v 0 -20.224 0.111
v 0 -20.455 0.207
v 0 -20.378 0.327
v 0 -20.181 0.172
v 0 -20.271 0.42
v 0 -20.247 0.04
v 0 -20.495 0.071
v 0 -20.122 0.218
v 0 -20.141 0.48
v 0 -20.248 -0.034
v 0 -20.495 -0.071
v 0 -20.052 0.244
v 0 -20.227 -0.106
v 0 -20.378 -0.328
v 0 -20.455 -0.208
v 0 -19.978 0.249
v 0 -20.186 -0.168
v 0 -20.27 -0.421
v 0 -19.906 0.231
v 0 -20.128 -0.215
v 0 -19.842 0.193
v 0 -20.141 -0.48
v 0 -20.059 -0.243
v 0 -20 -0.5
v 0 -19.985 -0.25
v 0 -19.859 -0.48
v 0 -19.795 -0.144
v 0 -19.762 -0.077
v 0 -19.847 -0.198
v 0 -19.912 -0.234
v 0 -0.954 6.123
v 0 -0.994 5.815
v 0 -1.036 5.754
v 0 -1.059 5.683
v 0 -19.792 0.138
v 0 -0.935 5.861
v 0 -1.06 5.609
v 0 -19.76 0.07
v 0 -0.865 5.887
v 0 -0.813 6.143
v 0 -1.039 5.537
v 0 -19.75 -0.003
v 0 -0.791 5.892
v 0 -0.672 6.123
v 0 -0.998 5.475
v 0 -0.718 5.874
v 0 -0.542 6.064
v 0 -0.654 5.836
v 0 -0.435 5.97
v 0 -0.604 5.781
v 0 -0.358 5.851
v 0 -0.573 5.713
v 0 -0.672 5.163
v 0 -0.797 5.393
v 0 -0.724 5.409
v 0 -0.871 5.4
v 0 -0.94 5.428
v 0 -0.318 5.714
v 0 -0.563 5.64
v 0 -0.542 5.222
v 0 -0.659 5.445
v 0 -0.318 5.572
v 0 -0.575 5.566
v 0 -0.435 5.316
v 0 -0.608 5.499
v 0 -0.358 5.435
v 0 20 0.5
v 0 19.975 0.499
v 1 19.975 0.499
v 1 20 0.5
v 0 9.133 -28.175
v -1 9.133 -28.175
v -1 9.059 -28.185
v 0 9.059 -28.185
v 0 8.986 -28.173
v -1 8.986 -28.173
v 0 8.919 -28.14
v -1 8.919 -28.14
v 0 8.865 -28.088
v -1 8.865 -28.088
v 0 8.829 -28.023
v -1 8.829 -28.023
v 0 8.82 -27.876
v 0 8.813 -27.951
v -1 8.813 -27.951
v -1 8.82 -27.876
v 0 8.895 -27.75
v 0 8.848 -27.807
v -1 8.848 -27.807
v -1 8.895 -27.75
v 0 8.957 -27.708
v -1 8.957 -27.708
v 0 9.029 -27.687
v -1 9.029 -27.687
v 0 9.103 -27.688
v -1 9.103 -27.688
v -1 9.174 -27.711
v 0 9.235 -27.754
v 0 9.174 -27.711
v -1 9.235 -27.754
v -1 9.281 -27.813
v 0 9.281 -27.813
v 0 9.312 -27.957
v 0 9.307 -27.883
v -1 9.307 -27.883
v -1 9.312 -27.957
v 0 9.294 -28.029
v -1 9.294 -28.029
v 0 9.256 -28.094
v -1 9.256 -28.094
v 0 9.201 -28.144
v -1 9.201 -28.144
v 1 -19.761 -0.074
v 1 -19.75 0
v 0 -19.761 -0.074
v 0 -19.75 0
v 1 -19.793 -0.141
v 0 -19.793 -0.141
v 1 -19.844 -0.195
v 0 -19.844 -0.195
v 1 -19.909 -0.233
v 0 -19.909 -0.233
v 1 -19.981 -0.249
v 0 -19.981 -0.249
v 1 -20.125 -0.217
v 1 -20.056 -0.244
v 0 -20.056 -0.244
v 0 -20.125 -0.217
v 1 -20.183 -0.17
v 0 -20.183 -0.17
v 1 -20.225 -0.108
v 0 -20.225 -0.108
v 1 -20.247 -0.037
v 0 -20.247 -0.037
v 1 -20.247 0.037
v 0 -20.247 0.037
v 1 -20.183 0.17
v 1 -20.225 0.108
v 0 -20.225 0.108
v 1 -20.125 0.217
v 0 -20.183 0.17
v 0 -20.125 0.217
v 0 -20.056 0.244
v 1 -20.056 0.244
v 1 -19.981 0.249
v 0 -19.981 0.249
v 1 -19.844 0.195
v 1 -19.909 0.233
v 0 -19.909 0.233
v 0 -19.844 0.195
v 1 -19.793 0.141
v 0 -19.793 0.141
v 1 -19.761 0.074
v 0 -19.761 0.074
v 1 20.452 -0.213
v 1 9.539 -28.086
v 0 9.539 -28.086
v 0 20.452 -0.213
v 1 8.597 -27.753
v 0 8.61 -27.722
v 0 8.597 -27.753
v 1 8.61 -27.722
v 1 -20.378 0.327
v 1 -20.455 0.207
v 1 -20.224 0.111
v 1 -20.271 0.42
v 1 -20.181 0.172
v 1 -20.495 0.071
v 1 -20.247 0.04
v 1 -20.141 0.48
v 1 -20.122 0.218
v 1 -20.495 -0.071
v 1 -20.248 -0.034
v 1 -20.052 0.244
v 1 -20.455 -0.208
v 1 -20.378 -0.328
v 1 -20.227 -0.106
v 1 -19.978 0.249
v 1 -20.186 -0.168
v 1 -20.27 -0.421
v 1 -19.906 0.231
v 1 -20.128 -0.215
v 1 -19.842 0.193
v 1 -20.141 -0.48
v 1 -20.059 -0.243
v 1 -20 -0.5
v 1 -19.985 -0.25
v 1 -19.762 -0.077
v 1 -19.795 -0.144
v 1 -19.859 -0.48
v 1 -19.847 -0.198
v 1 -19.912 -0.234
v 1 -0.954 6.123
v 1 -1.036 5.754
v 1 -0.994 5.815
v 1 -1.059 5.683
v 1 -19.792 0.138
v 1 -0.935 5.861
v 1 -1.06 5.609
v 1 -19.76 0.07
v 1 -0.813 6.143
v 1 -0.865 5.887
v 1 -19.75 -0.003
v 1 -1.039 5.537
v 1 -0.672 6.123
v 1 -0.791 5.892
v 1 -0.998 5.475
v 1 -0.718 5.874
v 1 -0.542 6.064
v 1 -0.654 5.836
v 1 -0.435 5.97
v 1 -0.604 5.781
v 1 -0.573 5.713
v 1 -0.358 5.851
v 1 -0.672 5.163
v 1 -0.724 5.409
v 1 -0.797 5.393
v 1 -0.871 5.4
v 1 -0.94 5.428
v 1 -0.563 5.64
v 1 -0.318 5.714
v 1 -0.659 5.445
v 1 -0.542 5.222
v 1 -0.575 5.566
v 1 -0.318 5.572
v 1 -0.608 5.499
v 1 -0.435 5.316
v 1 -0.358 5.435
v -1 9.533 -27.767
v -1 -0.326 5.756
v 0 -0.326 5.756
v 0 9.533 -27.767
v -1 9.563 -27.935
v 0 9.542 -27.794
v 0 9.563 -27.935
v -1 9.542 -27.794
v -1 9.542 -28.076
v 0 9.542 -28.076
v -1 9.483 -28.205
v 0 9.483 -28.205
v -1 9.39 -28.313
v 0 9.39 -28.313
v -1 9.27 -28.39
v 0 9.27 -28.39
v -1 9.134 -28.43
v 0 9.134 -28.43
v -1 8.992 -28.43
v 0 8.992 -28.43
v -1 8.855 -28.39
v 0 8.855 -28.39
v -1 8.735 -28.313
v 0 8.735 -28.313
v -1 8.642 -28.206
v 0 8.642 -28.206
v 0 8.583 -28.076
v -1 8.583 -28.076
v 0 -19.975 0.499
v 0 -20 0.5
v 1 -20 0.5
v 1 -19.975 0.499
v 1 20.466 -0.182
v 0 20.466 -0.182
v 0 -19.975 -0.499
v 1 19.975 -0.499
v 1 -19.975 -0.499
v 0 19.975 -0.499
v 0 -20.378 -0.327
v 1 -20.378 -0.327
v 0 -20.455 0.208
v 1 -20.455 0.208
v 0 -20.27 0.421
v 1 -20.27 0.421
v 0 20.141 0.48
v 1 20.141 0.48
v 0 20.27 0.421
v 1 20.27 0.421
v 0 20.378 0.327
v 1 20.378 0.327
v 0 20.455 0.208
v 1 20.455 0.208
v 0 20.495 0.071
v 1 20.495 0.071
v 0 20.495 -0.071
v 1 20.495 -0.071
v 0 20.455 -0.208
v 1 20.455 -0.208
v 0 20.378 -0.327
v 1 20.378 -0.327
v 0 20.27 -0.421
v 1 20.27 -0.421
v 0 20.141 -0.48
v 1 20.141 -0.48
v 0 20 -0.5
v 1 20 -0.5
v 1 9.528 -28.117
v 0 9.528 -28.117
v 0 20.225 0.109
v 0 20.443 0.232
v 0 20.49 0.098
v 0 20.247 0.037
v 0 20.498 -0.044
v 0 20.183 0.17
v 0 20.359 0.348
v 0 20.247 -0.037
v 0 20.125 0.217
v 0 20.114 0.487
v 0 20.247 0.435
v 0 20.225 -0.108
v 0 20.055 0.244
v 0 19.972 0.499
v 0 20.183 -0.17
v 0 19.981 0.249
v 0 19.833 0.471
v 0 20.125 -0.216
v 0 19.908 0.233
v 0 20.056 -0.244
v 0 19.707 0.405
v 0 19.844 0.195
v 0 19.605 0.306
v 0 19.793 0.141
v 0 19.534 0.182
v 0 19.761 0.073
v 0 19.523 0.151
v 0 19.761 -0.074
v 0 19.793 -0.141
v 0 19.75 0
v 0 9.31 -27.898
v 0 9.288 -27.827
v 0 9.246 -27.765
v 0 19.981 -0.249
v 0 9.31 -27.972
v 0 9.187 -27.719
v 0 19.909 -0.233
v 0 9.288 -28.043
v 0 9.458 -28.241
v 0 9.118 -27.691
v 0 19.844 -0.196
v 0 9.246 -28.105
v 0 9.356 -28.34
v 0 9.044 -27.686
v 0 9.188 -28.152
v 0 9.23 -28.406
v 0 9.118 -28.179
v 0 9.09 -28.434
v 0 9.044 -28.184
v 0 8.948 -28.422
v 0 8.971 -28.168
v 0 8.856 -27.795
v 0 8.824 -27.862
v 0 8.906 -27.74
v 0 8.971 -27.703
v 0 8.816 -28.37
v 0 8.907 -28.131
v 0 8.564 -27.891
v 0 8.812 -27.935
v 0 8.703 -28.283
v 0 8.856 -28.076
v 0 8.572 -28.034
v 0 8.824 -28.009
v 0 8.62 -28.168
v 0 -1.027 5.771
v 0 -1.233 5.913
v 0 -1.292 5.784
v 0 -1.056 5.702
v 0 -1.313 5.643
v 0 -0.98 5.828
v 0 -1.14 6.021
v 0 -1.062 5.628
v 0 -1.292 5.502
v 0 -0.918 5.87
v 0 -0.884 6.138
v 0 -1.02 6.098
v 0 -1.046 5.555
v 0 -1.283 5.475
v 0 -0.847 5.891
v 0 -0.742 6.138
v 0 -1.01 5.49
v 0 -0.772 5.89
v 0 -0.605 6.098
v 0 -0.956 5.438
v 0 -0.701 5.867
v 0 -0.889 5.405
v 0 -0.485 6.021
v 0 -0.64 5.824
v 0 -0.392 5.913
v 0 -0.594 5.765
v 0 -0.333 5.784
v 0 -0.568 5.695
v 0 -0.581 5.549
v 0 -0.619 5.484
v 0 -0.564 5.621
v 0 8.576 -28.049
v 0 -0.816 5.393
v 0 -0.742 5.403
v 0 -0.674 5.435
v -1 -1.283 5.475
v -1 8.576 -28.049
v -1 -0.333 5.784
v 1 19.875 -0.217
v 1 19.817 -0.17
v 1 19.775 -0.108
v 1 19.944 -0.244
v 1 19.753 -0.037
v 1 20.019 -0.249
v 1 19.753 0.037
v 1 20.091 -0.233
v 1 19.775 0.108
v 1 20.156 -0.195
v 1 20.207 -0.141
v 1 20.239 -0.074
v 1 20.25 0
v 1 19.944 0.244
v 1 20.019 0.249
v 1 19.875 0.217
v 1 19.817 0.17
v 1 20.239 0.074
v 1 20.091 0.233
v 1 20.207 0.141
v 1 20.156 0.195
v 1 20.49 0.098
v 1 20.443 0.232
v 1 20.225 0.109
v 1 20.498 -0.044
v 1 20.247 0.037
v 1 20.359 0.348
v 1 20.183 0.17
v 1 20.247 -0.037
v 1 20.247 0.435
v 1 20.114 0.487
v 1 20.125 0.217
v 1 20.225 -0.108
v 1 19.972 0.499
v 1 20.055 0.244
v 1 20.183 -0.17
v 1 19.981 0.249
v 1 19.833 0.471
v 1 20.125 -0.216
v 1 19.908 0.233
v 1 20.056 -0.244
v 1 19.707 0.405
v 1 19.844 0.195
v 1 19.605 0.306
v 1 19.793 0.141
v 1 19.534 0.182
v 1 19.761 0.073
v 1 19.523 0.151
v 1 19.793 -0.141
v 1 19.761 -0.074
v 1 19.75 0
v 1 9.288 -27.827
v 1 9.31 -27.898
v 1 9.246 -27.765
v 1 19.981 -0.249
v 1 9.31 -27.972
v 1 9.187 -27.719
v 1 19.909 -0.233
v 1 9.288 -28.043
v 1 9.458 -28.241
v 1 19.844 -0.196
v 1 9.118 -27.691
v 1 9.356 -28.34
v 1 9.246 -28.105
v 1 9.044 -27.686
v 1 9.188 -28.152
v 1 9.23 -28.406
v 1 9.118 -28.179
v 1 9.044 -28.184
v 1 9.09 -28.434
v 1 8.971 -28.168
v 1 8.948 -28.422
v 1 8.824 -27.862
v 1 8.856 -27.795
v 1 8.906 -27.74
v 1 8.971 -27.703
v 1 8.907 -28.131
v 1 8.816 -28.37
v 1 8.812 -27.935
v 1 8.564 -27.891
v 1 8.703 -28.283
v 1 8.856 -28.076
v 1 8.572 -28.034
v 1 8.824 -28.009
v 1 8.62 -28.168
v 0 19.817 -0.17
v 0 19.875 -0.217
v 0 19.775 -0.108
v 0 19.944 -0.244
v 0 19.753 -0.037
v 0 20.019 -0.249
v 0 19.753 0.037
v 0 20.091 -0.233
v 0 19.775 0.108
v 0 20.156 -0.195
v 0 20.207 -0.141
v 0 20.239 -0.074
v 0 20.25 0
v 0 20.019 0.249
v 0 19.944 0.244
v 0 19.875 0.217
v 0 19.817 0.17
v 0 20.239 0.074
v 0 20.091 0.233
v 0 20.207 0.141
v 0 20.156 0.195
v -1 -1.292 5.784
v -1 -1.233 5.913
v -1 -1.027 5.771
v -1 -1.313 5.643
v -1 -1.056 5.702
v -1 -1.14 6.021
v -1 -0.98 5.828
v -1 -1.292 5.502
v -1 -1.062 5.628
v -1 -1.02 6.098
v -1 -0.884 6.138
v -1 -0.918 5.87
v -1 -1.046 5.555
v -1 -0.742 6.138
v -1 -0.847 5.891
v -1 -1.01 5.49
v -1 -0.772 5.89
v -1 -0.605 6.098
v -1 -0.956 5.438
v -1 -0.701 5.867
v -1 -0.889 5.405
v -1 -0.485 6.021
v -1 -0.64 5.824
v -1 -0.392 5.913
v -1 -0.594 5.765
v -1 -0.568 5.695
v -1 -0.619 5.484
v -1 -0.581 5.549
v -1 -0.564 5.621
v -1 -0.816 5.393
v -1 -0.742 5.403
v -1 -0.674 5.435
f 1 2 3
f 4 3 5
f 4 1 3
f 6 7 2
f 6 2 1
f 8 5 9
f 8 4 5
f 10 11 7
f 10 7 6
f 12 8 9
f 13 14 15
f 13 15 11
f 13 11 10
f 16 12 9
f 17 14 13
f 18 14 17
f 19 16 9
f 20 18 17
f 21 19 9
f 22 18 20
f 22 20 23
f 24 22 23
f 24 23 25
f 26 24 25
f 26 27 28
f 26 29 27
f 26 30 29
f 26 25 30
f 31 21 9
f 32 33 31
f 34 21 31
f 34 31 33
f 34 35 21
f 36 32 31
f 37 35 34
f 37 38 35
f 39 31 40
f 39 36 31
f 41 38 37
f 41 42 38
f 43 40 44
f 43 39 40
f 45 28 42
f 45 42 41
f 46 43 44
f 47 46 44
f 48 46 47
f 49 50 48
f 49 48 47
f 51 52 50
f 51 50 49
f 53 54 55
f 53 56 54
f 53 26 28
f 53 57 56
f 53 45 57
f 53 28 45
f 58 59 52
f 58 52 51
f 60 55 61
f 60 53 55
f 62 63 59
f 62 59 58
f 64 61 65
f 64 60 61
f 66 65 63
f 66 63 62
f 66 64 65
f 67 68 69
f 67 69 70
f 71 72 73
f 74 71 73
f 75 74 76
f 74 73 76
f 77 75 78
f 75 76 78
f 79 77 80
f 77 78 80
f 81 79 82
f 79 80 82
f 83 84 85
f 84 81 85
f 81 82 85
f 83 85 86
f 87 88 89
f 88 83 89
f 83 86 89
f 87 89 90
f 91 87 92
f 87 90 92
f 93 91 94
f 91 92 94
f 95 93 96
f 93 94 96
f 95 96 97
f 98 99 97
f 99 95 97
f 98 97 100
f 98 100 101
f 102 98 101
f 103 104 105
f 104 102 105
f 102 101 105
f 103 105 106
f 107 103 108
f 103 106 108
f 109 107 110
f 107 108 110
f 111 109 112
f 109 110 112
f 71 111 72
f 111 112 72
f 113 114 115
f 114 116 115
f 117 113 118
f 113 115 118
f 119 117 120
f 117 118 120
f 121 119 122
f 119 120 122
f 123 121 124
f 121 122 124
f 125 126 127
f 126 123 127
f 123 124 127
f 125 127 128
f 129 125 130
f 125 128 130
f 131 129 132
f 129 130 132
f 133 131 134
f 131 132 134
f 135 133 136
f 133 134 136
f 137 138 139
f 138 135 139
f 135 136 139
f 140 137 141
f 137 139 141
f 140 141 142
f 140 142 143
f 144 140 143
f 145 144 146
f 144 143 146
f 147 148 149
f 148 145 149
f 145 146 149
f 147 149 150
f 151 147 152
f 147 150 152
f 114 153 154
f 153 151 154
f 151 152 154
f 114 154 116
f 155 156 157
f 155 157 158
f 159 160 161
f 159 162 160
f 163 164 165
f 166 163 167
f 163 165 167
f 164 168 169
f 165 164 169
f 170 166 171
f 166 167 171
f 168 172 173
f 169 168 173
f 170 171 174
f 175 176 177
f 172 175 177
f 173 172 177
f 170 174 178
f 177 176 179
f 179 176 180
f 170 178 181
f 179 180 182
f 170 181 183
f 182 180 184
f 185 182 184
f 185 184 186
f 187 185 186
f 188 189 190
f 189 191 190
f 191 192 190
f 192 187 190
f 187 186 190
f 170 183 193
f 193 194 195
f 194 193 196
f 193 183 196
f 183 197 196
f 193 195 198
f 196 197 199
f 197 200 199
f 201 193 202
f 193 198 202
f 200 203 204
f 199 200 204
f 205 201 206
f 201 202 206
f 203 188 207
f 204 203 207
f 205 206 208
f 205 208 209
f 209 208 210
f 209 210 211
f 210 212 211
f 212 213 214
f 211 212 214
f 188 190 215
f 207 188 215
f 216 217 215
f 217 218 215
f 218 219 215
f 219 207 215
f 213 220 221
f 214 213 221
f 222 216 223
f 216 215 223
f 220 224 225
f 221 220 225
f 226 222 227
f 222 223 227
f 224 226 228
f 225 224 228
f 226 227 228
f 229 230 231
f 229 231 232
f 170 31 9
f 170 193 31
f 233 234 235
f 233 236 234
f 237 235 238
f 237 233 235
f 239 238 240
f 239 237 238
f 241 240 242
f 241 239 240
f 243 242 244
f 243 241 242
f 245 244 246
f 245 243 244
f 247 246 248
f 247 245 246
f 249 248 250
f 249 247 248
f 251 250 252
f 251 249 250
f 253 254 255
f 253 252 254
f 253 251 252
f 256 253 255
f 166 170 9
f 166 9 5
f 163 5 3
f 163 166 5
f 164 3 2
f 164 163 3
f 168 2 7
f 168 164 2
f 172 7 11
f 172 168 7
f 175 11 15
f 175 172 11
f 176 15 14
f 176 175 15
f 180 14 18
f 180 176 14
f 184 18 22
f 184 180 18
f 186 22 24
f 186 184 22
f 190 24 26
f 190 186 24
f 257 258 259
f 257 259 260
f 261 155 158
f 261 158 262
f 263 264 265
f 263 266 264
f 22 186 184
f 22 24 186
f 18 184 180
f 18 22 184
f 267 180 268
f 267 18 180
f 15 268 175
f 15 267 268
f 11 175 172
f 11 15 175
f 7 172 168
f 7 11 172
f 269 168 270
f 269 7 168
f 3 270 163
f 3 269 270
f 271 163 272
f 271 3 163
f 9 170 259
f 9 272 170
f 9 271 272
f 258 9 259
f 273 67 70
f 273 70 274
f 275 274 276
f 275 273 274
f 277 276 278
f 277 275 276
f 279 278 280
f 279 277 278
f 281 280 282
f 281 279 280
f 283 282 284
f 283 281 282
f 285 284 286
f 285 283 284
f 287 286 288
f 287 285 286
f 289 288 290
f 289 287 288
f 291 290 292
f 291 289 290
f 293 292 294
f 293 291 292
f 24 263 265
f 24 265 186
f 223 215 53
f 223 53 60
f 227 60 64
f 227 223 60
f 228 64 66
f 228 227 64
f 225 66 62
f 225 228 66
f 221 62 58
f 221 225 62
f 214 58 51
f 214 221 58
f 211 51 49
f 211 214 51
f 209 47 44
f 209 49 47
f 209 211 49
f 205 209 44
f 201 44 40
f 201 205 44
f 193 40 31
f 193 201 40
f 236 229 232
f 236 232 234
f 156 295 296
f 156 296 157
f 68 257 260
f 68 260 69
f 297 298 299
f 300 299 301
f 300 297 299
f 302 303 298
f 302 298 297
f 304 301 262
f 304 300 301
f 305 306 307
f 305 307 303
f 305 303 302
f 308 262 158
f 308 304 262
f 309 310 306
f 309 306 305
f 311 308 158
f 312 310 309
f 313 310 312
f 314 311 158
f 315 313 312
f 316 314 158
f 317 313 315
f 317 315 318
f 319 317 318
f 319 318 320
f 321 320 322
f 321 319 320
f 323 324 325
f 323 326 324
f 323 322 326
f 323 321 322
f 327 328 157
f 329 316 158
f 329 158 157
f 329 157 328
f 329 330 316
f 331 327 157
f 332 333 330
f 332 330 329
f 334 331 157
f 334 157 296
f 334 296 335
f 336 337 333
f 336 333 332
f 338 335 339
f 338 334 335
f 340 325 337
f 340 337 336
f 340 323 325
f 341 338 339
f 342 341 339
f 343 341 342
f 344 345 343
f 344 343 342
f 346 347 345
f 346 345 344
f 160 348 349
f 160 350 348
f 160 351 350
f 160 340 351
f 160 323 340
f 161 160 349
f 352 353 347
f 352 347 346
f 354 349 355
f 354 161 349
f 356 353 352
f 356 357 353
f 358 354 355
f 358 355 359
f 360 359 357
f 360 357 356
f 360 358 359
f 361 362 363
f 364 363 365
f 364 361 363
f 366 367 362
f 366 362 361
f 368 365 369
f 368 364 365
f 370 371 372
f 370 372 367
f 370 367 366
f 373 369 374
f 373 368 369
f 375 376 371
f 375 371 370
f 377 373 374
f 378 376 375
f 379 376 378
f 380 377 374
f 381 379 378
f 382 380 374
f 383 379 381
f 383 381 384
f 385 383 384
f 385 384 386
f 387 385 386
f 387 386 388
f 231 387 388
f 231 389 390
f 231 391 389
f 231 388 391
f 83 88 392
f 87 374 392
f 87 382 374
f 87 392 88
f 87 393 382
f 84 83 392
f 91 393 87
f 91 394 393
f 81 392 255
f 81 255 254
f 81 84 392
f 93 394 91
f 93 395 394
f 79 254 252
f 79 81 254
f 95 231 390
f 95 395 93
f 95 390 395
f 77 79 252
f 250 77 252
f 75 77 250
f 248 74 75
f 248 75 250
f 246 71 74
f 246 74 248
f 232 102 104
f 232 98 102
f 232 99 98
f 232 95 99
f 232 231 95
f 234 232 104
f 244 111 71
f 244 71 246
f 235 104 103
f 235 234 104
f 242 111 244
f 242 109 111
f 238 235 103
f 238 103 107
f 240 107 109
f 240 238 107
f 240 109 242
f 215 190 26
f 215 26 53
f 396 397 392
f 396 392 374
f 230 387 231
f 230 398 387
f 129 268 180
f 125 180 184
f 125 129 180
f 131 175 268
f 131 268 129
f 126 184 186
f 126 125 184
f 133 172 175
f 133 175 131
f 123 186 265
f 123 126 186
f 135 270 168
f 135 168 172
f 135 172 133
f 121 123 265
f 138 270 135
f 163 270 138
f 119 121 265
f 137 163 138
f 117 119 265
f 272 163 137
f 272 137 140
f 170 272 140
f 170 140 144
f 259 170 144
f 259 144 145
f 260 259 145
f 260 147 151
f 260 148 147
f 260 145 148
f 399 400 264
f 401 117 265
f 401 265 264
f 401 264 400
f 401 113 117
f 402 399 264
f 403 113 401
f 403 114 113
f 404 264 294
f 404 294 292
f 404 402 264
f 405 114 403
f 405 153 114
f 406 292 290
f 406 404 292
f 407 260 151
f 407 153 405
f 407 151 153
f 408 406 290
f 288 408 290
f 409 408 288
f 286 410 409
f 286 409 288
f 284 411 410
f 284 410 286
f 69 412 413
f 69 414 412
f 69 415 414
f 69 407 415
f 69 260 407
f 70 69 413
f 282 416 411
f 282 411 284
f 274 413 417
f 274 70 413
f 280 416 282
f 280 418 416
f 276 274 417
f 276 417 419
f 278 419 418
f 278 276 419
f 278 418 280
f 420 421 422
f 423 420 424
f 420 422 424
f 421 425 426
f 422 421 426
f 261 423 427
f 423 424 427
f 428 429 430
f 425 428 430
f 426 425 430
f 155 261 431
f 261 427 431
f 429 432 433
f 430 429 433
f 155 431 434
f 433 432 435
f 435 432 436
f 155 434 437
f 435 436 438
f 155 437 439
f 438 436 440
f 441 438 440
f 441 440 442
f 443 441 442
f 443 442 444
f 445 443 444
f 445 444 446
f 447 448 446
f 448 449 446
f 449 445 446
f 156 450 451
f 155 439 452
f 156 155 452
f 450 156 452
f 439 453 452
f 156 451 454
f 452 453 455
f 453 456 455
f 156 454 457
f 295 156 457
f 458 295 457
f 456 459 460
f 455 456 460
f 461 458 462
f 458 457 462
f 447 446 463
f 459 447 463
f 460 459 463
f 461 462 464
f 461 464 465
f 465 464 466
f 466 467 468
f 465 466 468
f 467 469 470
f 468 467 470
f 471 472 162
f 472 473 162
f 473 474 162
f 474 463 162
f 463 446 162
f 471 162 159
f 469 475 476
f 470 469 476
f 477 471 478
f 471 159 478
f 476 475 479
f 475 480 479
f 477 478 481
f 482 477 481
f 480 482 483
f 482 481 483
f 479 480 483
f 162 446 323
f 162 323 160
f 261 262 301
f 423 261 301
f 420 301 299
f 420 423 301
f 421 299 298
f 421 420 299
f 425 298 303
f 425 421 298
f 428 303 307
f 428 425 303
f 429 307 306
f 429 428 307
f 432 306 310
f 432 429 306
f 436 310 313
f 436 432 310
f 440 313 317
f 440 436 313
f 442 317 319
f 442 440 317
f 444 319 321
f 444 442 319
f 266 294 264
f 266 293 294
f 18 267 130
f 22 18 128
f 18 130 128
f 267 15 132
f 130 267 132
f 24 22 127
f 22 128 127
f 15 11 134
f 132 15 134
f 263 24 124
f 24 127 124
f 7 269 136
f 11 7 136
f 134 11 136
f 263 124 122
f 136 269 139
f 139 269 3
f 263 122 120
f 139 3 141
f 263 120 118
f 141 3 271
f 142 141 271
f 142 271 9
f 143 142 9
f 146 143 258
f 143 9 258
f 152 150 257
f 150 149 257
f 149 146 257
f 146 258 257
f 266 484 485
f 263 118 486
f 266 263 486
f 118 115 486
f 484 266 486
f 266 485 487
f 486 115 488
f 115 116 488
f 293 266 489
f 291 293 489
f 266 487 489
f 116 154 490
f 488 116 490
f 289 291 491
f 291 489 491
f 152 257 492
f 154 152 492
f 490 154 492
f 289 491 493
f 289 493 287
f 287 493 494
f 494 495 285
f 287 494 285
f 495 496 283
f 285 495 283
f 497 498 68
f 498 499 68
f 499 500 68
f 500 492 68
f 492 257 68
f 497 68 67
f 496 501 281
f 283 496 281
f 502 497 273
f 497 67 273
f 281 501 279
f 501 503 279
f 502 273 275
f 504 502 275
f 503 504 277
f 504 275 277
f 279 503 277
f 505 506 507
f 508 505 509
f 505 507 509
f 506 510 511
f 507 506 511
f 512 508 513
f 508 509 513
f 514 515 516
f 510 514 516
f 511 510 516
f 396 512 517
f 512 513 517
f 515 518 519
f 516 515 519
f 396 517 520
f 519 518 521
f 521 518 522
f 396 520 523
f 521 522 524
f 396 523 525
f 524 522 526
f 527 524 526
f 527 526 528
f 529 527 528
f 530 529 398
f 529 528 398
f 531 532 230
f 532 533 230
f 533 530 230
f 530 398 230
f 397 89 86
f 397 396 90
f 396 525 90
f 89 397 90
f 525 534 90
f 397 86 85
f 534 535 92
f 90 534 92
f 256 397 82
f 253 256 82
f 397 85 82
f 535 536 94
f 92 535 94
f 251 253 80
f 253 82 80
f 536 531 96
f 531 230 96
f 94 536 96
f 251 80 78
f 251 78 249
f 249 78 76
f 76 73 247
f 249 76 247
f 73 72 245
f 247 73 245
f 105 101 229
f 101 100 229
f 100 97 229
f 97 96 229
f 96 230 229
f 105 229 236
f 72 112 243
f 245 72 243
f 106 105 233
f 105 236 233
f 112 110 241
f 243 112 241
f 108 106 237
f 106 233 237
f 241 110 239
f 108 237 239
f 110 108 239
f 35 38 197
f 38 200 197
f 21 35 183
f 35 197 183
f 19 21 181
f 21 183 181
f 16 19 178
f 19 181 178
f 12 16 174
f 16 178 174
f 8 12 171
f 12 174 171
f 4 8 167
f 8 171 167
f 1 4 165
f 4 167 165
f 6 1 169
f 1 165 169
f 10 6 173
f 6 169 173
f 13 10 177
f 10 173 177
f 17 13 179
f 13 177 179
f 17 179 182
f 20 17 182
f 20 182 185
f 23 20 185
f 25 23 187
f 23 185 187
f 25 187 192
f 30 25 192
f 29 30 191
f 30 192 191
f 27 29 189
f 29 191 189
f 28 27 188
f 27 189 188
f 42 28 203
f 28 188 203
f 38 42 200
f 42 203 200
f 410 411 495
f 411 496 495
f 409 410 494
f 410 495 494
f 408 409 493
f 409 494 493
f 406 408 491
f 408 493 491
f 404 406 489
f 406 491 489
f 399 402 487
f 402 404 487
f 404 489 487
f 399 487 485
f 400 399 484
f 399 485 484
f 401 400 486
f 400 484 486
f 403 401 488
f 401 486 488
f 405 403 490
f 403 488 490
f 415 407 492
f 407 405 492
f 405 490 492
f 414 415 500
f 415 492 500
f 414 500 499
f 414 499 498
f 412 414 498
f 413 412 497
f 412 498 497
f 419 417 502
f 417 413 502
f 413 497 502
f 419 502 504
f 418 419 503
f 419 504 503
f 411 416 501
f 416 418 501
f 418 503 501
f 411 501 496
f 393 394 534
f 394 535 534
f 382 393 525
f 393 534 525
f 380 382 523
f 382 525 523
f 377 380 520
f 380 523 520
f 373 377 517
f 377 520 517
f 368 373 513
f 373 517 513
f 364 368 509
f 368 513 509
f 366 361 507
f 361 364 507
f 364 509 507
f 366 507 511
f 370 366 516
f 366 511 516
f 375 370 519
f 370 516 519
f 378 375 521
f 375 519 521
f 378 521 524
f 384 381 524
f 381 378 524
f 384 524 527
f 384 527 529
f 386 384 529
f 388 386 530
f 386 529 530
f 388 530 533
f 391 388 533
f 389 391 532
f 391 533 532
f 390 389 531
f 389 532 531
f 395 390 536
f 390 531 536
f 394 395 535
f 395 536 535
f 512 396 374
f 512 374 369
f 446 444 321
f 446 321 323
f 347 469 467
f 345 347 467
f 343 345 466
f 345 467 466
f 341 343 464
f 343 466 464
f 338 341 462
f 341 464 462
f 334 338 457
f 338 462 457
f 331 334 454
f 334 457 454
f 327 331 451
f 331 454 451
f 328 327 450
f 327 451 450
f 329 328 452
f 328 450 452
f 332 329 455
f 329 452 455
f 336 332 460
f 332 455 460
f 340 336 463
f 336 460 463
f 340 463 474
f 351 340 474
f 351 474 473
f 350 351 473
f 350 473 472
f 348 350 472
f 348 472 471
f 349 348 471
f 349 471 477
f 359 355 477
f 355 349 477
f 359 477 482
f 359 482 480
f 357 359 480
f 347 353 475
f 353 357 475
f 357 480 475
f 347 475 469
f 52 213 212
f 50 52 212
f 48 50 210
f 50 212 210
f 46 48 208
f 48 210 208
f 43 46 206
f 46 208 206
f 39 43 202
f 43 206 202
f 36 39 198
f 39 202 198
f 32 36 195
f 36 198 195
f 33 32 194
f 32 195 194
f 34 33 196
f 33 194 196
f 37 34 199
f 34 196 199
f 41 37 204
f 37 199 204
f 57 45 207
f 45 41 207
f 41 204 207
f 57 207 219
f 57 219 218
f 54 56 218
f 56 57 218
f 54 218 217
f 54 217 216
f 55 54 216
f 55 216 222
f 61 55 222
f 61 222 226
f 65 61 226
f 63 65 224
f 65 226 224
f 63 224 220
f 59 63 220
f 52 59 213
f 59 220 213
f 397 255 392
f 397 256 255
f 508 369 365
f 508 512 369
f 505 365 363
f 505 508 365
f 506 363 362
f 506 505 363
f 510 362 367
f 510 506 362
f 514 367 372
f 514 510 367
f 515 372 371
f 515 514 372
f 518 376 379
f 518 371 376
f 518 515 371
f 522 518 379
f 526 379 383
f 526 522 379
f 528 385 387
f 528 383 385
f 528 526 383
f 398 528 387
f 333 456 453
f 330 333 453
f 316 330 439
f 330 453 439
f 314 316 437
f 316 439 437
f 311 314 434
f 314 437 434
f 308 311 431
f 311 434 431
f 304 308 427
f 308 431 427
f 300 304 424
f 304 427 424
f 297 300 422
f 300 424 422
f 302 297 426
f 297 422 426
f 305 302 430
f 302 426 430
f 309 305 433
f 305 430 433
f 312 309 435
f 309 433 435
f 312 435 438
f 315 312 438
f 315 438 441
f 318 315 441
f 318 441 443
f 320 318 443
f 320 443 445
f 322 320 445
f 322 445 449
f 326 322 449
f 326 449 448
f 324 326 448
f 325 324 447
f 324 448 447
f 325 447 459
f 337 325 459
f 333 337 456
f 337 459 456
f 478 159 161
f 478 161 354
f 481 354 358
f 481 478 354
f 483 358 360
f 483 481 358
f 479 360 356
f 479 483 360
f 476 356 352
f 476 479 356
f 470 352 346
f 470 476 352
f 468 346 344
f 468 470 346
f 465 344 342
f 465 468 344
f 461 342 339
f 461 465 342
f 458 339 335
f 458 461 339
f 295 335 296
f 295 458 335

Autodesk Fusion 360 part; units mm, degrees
sketch "Sketch1" plane through (0, 0, 0) normal (1, 0, 0) x (0, 1, 0)
  line L0 (20, -0.5) -> (-20, -0.5)
  line L1 (-20, 0.5) -> (20, 0.5)
  line L2 (20, -0.5) -> (-20, 0.5) construction
  line L3 (-20, -0.5) -> (20, 0.5) construction
  arc A0 (-19.975, 0.4994) -> (-19.975, -0.4994) centre (-20, 0) ccw
  arc A1 (19.975, -0.4994) -> (19.975, 0.4994) centre (20, 0) ccw
  circle A2 centre (-20, 0) radius 0.25
  circle A3 centre (20, 0) radius 0.25
  dimension "d1" = 40
  dimension "d2" = 0.5
  dimension "d3" = 0.5
extrude "Extrude1" add sketch "Sketch1" along normal blind 1 makes body 1
sketch "Sketch2" plane through (0, 0, 0) normal (1, 0, 0) x (0, 1, 0)
  line L0 (10, -0.5) -> (-10, -0.5)
  line L1 (-10, 0.5) -> (10, 0.5)
  line L2 (10, -0.5) -> (-10, 0.5) construction
  line L3 (-10, -0.5) -> (10, 0.5) construction
  arc A0 (-9.9501, 0.4975) -> (-9.9501, -0.4975) centre (-10, 0) ccw
  arc A1 (9.9501, -0.4975) -> (9.9501, 0.4975) centre (10, 0) ccw
  circle A2 centre (-10, 0) radius 0.25
  circle A3 centre (10, 0) radius 0.25
  dimension "d6" = 20
  dimension "d7" = 0.5
  dimension "d8" = 0.5
extrude "Extrude2" add sketch "Sketch2" along normal blind 1 separate body makes body 2
sketch "Sketch3" plane through (0, 0, 0) normal (1, 0, 0) x (0, 1, 0)
  line L0 (17.5, -0.5) -> (-17.5, -0.5)
  line L1 (-17.5, 0.5) -> (17.5, 0.5)
  line L2 (17.5, -0.5) -> (-17.5, 0.5) construction
  line L3 (-17.5, -0.5) -> (17.5, 0.5) construction
  arc A0 (-17.4715, 0.4992) -> (-17.4715, -0.4992) centre (-17.5, 0) ccw
  arc A1 (17.4715, -0.4992) -> (17.4715, 0.4992) centre (17.5, 0) ccw
  circle A2 centre (-17.5, 0) radius 0.25
  circle A3 centre (17.5, 0) radius 0.25
  dimension "d11" = 35
  dimension "d12" = 0.5
  dimension "d13" = 0.5
extrude "Extrude3" add sketch "Sketch3" along normal blind 1 separate body makes body 3
sketch "Sketch4" plane through (0, 0, 0) normal (1, 0, 0) x (0, 1, 0)
  line L0 (15, -0.5) -> (-15, -0.5)
  line L1 (-15, 0.5) -> (15, 0.5)
  line L2 (15, -0.5) -> (-15, 0.5) construction
  line L3 (-15, -0.5) -> (15, 0.5) construction
  arc A0 (-14.9667, 0.4989) -> (-14.9667, -0.4989) centre (-15, 0) ccw
  arc A1 (14.9667, -0.4989) -> (14.9667, 0.4989) centre (15, 0) ccw
  circle A2 centre (-15, 0) radius 0.25
  circle A3 centre (15, 0) radius 0.25
  dimension "d16" = 30
  dimension "d17" = 0.5
  dimension "d18" = 0.5
extrude "Extrude4" add sketch "Sketch4" along normal blind 1 separate body makes body 4
copy_body "Body->Comp1" bodies 4 removing the originals makes body 5 in component "3cmL4"
copy_body "Body->Comp2" bodies 3 removing the originals makes body 6 in component "3.5cmL3"
copy_body "Body->Comp3" bodies 2 removing the originals makes body 7 in component "2cmL2"
copy_body "Body->Comp4" bodies 1 removing the originals makes body 8 in component "4cmL1"
component "3cmL4" placed x (-1, 0, 0) y (0, -0.364583, -0.931171) z (0, -0.931171, 0.364583) at (1, 14.5312, -13.9676)
component "3.5cmL3" placed x (1, 0, 0) y (0, 0.282145, -0.959372) z (0, 0.959372, 0.282145) at (-1, 4.125, -11.1461)
component "2cmL2" placed x (-1, 0, 0) y (0, 0.959372, 0.282145) z (0, 0.282145, -0.959372) at (1, -10.4063, 2.8214)
component "4cmL1" placed x (1, 0, 0) y (0, 1, 0) z (0, 0, 1) at (0, 0, 0)
